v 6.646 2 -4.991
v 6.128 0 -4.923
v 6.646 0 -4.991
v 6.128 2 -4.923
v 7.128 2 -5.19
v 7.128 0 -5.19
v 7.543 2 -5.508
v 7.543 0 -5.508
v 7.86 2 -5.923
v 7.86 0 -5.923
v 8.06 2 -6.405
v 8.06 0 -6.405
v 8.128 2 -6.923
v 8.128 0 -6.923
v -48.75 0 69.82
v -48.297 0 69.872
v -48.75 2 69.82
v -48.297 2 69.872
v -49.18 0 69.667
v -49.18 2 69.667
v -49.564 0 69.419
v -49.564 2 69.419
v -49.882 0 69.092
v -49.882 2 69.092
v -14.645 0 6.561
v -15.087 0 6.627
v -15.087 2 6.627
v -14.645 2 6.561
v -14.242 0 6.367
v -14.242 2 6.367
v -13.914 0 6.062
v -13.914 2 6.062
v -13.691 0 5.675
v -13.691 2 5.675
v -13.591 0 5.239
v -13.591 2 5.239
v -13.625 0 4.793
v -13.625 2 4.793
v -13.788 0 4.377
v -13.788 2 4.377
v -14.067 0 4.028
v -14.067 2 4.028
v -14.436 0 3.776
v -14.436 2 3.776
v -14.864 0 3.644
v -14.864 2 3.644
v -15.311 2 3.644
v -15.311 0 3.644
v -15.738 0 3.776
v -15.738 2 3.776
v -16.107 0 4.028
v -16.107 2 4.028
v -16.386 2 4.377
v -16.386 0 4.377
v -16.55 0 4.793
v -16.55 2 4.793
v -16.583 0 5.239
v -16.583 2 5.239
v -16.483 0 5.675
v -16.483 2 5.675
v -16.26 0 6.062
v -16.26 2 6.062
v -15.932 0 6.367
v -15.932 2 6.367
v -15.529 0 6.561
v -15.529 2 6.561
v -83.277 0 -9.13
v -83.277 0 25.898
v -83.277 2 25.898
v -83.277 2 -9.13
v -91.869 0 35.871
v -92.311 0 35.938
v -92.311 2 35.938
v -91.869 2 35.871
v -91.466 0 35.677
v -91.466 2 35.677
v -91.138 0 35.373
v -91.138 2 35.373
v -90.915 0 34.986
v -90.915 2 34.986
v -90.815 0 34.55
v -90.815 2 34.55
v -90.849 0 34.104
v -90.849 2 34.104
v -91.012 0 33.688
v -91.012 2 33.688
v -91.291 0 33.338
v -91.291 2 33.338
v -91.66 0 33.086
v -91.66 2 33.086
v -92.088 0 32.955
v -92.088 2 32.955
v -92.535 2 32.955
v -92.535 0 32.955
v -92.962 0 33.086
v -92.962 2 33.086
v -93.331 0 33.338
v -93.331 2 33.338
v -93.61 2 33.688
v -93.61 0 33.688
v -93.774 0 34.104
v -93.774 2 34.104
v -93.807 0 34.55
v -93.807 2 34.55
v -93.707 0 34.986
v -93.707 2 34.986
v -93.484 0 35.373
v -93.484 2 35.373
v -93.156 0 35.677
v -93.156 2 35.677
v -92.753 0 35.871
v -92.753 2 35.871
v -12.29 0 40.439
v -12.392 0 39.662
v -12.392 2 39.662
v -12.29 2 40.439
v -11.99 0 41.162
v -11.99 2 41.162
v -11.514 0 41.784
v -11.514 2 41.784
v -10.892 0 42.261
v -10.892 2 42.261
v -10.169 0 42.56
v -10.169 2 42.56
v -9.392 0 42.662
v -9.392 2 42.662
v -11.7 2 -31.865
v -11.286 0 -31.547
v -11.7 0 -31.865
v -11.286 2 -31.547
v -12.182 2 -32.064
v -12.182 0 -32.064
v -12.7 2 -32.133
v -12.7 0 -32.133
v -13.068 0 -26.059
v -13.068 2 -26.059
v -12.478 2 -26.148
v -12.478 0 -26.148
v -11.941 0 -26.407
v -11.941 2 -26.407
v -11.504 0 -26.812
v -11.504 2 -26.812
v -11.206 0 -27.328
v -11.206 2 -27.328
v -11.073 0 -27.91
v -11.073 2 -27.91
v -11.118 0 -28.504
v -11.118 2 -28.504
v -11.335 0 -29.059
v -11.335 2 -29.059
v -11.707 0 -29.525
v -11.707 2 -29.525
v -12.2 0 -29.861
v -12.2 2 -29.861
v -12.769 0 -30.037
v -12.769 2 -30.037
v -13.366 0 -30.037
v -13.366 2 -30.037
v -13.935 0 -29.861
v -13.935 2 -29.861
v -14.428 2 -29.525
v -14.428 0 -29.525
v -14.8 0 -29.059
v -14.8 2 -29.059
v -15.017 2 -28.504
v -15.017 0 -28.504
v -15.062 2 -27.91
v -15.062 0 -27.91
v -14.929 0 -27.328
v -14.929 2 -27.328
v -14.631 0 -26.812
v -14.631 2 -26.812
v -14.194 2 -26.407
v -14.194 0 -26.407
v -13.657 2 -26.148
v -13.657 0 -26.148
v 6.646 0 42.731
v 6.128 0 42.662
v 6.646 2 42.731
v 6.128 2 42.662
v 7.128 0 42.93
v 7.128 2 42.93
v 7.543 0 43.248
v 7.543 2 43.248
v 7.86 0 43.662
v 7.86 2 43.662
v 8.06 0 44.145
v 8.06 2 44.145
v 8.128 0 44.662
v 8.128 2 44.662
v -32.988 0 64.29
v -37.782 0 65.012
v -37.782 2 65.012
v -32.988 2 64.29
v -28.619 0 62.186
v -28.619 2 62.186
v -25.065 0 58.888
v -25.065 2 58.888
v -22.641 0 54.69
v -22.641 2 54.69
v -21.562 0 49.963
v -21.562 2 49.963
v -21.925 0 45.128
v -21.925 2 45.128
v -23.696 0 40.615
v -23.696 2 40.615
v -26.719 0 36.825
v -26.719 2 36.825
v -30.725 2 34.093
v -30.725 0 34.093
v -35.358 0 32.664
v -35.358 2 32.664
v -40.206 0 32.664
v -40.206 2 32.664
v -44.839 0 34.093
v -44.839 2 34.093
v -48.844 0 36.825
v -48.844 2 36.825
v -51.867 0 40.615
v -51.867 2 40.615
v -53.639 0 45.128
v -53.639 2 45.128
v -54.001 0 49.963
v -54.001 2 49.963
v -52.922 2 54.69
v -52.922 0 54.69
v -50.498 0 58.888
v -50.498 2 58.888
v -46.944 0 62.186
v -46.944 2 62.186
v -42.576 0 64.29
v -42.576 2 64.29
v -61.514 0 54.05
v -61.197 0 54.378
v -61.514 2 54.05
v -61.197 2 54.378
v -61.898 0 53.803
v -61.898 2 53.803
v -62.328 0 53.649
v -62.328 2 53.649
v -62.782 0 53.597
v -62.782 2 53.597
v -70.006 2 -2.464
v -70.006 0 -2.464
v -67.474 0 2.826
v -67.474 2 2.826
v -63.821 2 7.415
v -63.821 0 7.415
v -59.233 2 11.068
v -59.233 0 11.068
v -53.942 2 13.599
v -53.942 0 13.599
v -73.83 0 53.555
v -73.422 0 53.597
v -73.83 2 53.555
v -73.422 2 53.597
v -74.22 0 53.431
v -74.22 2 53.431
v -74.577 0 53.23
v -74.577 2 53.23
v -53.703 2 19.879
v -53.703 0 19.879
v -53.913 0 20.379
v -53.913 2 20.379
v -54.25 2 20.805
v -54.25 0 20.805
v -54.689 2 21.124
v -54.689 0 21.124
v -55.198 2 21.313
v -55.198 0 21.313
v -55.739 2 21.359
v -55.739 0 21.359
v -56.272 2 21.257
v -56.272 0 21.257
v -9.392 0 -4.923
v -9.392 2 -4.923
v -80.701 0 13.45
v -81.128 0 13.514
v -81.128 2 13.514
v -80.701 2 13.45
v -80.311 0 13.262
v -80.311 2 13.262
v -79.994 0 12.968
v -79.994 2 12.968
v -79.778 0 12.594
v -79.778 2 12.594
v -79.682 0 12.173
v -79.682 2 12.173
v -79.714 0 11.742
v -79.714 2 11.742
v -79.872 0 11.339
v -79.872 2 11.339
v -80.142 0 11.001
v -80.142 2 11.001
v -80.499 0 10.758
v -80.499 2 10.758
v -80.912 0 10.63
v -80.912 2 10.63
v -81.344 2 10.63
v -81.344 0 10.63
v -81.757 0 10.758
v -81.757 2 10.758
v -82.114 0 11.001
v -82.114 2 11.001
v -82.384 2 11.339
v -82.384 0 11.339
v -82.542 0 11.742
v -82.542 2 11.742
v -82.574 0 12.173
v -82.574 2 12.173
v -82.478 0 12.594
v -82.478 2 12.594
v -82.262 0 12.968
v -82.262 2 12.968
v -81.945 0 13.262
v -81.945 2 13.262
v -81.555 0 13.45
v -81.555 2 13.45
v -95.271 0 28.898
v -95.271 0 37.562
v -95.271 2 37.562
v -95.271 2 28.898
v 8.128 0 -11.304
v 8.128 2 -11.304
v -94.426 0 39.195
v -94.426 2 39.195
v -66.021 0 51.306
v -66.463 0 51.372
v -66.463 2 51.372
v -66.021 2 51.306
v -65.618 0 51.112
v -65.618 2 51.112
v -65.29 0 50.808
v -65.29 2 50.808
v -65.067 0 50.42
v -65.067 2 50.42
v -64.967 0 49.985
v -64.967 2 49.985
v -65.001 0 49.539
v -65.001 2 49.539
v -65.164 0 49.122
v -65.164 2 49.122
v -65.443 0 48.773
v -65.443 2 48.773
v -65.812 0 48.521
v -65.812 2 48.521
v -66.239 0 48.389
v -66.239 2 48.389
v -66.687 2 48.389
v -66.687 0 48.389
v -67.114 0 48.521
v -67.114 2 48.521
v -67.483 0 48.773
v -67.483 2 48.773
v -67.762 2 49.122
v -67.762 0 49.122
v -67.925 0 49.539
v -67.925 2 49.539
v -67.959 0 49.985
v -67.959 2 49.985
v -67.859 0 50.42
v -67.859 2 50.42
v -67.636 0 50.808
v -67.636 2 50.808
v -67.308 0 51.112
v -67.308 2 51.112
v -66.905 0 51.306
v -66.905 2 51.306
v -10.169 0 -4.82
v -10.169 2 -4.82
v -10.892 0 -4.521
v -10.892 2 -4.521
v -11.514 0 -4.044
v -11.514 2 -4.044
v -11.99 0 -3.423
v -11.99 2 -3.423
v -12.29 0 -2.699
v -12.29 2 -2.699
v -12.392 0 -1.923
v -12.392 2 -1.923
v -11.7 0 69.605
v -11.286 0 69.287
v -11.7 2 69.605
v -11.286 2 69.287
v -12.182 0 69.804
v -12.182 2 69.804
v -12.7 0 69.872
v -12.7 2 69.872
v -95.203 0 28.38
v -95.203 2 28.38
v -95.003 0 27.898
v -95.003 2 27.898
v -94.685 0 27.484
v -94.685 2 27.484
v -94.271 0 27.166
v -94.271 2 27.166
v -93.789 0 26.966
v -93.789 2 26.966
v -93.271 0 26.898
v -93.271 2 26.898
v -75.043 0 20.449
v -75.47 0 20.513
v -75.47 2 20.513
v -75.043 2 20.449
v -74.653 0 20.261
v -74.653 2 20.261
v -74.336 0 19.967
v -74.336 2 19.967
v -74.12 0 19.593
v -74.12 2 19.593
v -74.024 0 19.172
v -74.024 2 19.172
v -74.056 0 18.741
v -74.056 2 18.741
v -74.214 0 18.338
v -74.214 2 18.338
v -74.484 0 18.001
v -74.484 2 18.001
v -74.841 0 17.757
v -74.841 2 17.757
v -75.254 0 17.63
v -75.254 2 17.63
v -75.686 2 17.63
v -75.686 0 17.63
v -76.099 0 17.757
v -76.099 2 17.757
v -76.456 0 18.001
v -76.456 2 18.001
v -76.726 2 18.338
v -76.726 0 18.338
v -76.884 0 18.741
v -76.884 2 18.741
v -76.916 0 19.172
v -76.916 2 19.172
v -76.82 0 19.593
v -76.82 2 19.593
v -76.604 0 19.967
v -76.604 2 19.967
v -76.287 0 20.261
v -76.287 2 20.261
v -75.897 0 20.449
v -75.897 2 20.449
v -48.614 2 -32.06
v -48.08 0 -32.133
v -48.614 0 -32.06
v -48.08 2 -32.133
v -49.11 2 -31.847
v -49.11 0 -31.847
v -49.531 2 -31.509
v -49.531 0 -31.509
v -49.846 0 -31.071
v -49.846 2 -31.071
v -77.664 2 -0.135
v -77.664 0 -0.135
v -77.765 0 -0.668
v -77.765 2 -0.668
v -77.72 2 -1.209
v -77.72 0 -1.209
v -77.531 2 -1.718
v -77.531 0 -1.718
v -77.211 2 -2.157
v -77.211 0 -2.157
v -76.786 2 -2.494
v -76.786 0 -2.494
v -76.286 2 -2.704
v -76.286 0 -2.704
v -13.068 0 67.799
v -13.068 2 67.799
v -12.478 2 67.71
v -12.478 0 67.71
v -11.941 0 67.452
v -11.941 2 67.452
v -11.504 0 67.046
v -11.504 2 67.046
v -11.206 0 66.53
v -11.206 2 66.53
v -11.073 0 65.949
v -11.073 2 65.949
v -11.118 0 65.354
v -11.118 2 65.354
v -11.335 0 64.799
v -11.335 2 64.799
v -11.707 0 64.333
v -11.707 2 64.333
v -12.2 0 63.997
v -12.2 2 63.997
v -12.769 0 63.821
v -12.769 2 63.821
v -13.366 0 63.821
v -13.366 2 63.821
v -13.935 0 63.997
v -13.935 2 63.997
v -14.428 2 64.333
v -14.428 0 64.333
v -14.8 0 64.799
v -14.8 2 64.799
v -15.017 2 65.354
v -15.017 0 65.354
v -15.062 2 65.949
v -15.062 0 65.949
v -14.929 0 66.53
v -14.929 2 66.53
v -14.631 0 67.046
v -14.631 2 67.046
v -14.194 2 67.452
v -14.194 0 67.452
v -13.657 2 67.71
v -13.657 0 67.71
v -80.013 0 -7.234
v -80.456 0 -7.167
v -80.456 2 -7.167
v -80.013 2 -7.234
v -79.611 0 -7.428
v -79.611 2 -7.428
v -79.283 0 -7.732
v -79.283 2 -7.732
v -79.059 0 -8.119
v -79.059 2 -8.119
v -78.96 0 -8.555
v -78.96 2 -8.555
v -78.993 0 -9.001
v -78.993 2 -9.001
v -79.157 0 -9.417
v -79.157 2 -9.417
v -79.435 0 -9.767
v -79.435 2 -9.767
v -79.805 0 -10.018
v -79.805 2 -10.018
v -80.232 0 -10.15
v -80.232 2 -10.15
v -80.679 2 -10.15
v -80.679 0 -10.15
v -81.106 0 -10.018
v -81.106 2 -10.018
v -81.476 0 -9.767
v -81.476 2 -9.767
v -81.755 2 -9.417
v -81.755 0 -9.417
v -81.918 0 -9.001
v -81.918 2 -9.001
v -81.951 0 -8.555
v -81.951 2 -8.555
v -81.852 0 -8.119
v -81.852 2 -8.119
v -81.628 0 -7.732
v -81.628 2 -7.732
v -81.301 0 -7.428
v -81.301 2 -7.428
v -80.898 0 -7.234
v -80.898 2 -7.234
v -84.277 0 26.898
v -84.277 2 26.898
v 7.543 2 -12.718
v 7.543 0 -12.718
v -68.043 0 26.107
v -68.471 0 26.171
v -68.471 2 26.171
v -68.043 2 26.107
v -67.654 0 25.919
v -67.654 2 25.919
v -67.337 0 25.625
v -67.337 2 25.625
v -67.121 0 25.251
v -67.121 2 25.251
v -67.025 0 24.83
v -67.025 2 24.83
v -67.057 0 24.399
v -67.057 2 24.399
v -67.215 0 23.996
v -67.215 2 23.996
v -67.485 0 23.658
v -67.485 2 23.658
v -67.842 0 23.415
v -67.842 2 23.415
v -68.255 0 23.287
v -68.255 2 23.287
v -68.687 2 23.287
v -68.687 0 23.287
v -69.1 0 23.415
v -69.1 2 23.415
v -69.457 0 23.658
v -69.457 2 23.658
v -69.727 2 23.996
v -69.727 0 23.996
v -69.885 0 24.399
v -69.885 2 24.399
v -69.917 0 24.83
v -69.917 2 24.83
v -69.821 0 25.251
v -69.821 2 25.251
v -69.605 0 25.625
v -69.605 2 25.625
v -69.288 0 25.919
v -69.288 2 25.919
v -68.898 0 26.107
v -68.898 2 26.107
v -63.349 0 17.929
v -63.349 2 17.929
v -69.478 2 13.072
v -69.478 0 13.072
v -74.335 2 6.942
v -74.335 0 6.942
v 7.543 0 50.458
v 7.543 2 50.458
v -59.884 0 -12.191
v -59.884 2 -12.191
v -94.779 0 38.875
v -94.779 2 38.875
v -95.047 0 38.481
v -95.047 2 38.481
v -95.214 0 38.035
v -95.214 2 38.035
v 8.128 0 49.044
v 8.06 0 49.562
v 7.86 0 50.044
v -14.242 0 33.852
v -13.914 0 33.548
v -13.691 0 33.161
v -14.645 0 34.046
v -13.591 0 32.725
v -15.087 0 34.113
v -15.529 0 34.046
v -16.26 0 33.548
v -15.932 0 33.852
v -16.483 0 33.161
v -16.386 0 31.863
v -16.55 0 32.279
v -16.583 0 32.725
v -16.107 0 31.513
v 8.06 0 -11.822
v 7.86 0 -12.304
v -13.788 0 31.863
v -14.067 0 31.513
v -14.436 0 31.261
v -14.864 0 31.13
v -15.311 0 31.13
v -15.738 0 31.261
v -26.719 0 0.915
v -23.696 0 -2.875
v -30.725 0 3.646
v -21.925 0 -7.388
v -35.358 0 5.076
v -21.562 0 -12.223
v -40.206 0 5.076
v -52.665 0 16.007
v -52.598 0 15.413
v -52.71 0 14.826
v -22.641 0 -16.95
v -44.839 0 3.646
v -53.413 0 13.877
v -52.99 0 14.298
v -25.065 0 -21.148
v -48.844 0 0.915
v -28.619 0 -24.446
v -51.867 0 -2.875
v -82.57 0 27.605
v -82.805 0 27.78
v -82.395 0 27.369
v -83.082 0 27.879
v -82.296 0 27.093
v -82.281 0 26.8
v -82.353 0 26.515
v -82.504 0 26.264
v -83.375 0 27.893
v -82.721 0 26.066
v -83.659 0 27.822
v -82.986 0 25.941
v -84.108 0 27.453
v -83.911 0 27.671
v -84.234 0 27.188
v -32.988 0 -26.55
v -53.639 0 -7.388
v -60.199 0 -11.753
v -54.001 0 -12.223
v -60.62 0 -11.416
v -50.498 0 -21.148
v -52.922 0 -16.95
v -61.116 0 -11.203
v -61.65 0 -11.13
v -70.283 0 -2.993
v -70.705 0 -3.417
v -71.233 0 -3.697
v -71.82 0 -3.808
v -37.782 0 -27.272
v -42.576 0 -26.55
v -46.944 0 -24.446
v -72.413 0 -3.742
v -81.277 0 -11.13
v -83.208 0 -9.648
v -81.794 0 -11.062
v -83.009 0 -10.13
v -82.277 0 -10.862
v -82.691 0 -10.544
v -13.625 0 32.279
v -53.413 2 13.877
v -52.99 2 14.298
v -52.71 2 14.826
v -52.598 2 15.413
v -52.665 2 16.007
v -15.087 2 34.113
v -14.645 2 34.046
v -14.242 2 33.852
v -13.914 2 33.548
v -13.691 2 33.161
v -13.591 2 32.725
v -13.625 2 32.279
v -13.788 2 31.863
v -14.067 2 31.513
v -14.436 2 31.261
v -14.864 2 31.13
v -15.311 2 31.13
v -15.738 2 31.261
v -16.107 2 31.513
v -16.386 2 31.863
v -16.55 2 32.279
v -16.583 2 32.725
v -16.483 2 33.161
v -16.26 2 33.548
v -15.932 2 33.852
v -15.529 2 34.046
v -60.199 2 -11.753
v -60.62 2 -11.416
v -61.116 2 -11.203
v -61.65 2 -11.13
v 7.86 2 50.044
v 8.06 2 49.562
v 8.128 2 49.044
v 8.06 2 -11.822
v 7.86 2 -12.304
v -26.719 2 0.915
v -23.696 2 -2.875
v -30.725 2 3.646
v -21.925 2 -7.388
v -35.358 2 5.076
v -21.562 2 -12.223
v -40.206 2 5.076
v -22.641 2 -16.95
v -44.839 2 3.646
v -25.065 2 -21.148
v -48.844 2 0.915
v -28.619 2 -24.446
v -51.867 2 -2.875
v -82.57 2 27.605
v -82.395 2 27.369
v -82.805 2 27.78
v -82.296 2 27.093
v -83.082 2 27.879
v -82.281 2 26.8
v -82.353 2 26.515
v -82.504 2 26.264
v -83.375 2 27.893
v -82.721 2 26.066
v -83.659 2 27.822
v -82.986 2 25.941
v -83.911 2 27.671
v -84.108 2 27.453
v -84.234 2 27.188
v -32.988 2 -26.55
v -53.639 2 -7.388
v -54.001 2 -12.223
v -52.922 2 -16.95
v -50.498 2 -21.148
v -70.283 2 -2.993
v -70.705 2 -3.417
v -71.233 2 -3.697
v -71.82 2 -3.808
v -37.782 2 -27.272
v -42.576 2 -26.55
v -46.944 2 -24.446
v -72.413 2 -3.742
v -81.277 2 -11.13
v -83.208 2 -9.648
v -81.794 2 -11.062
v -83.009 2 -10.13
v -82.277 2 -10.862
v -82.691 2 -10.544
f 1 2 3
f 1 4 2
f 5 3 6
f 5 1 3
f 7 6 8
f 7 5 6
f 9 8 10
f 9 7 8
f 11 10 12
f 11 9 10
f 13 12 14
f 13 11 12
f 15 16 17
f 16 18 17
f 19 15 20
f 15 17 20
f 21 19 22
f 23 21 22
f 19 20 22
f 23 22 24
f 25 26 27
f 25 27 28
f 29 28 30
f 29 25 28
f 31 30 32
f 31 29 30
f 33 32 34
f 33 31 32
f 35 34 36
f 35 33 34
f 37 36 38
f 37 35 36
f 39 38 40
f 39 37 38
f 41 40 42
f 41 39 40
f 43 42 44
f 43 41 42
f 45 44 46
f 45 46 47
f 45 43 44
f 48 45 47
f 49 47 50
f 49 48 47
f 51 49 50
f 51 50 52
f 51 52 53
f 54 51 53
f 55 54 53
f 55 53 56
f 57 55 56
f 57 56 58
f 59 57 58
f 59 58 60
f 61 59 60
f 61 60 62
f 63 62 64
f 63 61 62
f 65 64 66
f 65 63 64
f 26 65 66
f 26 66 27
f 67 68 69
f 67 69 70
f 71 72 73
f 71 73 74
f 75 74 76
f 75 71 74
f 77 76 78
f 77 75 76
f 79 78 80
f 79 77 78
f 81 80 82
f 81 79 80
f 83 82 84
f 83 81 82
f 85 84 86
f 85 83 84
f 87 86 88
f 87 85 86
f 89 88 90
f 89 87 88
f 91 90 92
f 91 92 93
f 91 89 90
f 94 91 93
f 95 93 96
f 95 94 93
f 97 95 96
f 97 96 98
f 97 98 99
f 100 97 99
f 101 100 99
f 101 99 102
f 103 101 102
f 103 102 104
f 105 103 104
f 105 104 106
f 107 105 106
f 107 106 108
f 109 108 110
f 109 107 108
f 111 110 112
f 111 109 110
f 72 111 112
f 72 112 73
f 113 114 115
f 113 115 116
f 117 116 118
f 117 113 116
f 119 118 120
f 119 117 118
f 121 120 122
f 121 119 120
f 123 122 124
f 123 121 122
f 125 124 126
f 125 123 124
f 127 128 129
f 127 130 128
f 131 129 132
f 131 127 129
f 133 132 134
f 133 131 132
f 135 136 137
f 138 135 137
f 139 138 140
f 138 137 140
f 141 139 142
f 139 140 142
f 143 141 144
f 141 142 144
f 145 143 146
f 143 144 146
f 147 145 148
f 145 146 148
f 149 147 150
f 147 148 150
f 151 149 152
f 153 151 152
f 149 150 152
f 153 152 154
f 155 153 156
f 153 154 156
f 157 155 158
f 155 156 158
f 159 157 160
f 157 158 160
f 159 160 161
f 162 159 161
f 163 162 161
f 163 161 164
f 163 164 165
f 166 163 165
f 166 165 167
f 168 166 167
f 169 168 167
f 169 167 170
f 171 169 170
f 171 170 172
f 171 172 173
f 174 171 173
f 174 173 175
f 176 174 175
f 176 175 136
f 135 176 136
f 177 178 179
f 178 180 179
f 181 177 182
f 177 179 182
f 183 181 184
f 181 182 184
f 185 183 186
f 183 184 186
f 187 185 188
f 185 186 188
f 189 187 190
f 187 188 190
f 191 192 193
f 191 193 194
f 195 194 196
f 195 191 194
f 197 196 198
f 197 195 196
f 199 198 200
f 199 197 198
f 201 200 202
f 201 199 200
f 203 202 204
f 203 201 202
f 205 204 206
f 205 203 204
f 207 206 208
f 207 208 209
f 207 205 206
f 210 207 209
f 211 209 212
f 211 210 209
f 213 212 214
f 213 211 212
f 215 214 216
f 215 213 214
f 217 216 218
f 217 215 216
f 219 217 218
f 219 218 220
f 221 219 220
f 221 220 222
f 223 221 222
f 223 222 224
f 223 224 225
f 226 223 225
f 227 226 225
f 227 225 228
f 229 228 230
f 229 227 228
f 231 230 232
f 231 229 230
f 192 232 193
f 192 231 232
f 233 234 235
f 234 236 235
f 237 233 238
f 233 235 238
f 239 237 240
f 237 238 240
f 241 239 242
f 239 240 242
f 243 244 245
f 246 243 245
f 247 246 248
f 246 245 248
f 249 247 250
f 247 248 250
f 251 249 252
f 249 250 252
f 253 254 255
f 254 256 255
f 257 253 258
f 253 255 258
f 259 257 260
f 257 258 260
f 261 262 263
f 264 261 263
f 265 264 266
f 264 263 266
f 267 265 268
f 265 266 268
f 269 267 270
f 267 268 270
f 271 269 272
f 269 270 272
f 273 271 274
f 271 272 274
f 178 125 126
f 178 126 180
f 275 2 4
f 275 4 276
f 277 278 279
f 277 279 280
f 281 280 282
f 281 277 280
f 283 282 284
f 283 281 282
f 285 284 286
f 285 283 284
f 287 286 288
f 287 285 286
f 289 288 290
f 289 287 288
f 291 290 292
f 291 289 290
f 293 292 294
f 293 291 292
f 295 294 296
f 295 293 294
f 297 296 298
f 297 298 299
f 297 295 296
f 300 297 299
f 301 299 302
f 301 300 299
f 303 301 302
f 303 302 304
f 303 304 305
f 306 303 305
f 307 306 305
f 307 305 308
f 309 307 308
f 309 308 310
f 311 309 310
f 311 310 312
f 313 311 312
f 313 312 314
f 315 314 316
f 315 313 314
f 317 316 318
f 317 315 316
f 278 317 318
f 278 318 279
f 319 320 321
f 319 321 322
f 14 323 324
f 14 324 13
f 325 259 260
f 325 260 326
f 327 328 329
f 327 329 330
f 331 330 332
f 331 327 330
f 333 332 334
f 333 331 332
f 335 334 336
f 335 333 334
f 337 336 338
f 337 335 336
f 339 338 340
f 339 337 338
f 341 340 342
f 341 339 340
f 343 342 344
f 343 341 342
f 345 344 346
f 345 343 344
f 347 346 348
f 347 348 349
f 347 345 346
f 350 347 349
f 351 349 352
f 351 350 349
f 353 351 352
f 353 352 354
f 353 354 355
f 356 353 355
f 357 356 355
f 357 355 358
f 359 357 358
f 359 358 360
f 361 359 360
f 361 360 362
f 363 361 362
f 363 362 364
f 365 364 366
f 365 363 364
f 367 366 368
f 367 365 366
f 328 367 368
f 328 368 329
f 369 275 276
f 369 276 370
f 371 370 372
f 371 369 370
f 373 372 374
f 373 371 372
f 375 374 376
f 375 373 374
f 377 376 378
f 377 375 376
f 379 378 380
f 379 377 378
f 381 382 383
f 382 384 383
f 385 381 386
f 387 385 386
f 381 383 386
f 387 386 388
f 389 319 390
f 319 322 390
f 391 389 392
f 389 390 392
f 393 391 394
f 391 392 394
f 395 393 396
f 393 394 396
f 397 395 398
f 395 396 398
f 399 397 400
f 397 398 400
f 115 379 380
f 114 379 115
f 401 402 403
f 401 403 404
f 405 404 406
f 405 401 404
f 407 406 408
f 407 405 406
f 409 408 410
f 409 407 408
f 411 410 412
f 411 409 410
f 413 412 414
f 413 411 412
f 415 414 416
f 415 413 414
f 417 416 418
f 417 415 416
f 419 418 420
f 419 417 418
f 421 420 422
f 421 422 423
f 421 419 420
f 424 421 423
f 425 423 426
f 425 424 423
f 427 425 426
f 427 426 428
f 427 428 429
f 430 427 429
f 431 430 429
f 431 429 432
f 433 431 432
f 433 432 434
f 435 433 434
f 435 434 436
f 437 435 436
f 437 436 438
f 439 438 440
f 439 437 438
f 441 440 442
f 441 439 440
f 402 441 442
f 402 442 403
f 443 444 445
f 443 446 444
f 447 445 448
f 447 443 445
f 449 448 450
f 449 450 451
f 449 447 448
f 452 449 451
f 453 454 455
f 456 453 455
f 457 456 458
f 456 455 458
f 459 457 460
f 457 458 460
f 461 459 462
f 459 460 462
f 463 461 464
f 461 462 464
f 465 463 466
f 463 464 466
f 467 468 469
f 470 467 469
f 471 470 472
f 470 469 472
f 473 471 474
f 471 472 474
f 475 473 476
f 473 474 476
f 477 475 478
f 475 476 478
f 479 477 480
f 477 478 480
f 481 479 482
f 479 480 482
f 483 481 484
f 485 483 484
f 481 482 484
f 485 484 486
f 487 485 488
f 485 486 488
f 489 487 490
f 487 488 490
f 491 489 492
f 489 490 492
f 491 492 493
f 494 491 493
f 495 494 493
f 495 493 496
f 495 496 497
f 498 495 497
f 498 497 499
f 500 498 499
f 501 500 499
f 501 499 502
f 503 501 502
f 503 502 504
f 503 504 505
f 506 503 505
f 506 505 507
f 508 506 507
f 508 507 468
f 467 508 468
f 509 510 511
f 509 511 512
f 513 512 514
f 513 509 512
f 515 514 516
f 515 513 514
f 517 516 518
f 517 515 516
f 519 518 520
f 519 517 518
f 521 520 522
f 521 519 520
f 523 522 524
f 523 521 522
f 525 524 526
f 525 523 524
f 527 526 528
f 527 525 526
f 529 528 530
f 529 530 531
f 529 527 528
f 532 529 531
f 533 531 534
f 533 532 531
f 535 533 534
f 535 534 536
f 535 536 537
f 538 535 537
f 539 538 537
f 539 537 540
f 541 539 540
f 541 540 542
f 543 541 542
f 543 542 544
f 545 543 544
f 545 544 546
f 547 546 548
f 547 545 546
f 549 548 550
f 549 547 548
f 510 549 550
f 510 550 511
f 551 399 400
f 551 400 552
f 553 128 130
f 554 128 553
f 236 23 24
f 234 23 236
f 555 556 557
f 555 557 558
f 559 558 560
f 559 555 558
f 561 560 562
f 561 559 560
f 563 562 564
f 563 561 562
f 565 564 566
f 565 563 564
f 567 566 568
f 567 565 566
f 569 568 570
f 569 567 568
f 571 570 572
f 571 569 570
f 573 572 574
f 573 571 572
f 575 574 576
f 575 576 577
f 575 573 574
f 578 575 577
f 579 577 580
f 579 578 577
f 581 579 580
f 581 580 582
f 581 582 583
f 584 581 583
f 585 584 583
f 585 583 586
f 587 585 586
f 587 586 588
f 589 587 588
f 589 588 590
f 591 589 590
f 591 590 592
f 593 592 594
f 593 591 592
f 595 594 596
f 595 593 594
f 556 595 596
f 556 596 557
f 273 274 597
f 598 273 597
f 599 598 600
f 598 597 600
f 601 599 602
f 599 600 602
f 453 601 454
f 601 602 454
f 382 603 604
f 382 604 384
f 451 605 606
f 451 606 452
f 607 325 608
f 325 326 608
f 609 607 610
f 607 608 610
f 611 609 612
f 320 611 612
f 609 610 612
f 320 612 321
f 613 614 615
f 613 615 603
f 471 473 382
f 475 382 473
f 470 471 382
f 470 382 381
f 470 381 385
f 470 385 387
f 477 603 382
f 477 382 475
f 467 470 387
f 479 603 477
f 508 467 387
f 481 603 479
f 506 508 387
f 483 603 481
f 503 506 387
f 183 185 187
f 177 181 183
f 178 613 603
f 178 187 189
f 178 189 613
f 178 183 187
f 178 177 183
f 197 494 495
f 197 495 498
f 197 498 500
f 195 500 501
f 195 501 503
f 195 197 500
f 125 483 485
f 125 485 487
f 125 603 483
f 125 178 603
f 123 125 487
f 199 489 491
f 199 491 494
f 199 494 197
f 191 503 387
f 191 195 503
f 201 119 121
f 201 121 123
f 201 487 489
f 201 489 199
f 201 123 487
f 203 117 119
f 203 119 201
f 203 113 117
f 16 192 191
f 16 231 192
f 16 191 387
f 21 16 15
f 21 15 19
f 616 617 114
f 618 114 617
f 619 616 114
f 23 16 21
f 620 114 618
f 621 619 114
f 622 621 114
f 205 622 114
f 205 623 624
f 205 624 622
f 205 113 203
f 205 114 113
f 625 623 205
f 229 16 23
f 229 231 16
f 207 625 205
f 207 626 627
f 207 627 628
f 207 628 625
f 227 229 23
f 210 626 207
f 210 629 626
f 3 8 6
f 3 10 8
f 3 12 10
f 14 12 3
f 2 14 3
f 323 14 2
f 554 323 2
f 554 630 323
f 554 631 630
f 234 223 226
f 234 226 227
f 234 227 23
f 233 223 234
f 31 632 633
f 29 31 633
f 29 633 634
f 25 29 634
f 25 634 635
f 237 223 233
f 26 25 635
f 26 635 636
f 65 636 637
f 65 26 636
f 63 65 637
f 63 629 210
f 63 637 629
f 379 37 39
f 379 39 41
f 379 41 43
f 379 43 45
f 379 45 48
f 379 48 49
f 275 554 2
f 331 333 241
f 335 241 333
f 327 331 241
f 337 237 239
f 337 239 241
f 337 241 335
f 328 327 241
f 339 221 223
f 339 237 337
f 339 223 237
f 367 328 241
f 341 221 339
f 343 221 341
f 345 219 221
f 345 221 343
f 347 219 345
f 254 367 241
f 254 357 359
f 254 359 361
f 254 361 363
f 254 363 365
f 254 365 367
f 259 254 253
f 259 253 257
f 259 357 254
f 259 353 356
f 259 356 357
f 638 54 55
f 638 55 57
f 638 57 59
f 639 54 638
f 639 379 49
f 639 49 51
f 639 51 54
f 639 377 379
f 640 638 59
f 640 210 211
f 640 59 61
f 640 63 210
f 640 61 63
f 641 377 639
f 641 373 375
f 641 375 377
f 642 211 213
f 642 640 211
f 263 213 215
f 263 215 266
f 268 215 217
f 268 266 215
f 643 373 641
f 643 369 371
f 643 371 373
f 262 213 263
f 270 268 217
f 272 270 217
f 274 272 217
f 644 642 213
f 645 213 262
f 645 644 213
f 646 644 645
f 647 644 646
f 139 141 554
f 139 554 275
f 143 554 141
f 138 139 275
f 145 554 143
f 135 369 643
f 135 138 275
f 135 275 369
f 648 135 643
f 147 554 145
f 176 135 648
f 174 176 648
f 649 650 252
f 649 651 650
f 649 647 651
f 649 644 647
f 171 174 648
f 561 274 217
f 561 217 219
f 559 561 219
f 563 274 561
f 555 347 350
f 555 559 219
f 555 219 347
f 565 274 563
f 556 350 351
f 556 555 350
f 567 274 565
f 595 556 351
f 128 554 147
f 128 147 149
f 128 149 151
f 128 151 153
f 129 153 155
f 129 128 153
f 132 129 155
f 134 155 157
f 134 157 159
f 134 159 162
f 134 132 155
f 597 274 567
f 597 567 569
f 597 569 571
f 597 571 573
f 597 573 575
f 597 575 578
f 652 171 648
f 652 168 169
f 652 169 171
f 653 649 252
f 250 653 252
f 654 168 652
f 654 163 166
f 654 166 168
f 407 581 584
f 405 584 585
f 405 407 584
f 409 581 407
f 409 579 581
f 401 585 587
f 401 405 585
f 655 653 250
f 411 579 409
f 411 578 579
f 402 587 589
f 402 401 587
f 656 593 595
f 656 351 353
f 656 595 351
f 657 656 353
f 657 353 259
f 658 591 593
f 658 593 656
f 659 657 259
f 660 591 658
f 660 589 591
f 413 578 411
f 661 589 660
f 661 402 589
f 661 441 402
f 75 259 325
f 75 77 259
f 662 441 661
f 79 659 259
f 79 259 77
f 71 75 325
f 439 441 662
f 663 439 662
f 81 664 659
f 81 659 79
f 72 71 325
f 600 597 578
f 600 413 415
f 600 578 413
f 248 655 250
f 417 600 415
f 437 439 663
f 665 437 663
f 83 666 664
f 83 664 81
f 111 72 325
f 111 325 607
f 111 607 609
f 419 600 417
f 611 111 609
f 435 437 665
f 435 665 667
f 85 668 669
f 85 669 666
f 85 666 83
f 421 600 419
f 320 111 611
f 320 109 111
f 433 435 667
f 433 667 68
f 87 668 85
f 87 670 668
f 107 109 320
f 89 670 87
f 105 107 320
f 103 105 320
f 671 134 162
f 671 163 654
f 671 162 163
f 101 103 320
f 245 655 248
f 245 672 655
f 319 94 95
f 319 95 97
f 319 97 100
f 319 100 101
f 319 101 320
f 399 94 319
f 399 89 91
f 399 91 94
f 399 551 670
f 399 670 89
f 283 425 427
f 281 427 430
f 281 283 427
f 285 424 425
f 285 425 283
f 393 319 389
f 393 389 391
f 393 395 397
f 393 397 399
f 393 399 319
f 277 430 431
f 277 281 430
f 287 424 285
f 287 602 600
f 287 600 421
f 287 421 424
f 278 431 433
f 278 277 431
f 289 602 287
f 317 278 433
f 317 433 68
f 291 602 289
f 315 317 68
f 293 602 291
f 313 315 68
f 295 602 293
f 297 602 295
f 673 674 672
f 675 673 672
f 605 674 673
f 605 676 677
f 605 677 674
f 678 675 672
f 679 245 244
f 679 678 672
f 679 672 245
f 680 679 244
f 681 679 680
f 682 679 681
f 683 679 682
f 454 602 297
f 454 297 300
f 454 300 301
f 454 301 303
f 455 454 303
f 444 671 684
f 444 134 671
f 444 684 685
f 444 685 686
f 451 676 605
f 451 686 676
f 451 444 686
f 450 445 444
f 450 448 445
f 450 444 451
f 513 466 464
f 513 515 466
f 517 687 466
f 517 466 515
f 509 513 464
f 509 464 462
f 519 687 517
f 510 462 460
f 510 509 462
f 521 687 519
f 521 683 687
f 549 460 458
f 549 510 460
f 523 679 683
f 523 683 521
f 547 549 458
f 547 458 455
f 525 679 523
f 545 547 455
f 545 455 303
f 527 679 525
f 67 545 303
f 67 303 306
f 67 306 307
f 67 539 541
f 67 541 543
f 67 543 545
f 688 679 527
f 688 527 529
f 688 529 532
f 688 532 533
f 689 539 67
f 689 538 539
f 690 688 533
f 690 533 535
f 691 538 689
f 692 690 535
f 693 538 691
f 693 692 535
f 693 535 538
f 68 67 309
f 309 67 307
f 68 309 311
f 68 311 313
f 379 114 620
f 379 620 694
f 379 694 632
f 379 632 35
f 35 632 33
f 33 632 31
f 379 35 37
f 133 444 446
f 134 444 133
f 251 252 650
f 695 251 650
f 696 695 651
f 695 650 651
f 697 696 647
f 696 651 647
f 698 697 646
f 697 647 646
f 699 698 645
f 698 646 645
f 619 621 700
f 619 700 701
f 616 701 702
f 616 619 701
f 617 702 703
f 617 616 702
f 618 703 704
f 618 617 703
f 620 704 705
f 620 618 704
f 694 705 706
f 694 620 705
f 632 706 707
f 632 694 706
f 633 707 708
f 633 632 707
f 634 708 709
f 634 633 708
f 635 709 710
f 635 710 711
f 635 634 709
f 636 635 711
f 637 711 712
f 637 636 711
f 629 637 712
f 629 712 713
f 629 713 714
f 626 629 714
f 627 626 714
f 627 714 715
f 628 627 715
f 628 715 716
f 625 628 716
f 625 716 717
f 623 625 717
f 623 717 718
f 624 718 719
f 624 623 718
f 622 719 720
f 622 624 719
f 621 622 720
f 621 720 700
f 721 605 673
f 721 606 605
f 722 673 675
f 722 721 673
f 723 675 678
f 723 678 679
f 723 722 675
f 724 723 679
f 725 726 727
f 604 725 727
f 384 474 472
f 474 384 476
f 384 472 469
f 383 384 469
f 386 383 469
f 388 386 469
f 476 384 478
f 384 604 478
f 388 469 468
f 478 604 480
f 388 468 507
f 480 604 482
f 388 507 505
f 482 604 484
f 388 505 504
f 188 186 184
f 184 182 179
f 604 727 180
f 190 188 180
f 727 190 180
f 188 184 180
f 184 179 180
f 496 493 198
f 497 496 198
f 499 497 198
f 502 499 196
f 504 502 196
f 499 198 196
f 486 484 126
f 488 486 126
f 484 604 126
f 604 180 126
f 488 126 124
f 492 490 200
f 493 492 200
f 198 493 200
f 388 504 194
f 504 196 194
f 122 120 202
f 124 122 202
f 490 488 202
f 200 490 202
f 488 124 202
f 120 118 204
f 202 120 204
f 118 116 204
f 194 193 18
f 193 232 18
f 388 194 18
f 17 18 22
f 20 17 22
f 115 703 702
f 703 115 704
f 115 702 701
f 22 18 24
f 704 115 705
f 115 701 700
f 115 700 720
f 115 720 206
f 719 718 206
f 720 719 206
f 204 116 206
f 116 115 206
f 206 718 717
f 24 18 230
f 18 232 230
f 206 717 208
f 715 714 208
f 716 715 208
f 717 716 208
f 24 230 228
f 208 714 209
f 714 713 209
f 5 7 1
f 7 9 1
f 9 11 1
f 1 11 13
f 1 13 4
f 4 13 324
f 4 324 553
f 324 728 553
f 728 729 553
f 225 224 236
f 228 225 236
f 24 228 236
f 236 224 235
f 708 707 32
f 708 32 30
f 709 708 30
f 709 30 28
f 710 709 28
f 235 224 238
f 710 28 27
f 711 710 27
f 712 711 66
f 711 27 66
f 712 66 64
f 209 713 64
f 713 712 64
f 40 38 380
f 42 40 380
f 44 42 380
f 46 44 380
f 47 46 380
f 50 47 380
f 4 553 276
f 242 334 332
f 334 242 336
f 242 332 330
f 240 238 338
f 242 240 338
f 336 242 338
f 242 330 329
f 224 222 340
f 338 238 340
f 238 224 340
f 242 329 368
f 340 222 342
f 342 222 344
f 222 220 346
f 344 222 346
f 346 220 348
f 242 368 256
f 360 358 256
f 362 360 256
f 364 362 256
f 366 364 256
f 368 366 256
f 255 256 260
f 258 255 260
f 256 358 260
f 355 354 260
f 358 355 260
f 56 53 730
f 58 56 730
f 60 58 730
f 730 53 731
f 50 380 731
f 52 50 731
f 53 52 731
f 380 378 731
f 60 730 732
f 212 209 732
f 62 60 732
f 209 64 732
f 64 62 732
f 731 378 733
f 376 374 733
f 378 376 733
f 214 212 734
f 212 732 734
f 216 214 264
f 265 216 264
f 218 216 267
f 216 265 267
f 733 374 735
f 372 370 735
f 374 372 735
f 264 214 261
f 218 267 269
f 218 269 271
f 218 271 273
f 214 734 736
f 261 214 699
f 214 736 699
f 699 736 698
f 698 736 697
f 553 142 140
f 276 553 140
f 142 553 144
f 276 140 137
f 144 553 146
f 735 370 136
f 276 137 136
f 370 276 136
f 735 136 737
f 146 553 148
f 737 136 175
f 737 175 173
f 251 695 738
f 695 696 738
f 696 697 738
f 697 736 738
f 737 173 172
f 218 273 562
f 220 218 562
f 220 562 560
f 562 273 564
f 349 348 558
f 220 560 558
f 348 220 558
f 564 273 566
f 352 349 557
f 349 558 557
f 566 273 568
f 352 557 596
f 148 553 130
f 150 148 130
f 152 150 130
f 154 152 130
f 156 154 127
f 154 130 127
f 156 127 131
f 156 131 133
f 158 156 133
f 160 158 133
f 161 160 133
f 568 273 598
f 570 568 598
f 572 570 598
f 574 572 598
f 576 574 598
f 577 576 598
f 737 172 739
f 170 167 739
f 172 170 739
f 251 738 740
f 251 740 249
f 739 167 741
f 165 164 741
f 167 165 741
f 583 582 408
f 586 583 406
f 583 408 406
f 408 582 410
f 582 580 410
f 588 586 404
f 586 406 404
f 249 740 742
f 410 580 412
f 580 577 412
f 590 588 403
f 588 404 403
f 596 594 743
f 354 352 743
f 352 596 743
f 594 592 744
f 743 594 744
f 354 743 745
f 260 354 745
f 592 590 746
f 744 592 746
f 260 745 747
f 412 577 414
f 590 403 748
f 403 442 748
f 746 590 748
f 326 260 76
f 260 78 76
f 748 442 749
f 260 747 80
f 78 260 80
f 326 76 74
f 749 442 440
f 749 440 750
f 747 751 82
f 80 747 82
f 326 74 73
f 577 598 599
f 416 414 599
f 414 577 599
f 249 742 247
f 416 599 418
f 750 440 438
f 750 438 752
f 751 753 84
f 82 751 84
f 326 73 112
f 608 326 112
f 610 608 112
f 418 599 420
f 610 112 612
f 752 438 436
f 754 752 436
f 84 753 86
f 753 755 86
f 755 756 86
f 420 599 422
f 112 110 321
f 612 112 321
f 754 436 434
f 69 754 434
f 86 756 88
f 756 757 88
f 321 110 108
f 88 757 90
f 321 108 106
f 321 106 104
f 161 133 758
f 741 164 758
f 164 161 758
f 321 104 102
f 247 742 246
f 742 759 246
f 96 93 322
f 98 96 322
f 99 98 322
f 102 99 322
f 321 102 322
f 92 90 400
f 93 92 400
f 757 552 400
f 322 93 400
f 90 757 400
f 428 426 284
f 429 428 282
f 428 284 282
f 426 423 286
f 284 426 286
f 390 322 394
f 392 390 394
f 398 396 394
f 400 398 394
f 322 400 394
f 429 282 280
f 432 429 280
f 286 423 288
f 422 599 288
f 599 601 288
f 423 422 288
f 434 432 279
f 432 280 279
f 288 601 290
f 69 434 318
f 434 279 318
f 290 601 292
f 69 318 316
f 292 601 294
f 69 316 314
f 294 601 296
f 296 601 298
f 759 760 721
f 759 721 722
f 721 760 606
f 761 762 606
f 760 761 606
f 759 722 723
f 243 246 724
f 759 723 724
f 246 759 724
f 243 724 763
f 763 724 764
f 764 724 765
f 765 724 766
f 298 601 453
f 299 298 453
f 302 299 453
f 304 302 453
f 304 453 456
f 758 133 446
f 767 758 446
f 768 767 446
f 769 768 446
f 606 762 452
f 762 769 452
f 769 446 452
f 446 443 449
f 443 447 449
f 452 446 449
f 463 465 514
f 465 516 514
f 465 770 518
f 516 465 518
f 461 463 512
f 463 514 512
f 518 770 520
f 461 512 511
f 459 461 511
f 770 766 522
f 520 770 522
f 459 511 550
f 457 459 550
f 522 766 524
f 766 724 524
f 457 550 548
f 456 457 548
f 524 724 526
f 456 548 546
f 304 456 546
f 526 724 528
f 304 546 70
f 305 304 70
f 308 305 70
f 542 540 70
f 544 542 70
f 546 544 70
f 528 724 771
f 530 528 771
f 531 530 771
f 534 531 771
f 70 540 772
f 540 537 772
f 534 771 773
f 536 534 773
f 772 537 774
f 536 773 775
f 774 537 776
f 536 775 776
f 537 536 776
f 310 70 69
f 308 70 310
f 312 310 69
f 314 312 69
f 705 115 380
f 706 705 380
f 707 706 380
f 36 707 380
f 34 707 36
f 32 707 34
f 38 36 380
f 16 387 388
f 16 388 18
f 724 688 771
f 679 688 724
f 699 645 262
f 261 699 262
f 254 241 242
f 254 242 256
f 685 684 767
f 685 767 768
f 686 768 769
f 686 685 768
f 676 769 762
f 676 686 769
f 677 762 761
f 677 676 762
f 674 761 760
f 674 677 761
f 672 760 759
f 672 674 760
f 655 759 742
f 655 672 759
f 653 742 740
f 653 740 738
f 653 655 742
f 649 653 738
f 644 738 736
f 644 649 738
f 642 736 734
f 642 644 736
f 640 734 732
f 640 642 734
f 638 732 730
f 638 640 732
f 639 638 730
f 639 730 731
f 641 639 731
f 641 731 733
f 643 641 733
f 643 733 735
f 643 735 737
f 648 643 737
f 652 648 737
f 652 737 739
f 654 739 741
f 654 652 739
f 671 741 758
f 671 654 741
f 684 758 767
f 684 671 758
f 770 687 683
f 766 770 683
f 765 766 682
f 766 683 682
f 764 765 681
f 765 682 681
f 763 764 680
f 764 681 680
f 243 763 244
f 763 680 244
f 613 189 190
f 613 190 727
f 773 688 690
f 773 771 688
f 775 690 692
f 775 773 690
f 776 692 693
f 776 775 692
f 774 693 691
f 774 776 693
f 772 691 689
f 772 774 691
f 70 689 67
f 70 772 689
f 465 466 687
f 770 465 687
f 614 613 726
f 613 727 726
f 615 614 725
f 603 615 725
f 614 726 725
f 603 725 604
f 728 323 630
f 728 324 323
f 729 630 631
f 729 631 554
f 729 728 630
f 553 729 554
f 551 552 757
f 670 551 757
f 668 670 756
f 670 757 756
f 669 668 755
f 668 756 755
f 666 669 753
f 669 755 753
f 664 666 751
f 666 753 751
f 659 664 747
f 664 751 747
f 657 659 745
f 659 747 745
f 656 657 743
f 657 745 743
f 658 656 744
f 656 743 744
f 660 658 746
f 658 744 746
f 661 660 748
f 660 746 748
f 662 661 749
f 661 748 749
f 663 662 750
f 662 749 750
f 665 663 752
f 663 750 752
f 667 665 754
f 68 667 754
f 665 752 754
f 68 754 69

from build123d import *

# Parameters (mm, degrees)
SKETCH1_R           = 16.264719519
SKETCH1_R_2         = 1.5
SKETCH1_R_3         = 1.45
BOSS_EXTRUDE1_DEPTH = 2
SKETCH2_R           = 2
CUT_EXTRUDE1_DEPTH  = 119.16416129
FILLET1_R           = 2
SKETCH3_R           = 1
CUT_EXTRUDE2_DEPTH  = 10


with BuildPart() as part:
    # Sketch1 → Boss-Extrude1 (new body)
    with BuildSketch(Plane(origin=(0, 0, 0), x_dir=(1, 0, 0), z_dir=(0, 1, 0))):
        with BuildLine():
            Line((-12.392234006, -6.981301864), (-12.392234006, -30.758658484))
            Line((-12.392234006, -30.758658484), (-12.392234006, -37.869980174))
            Line((-12.392234006, -37.869980174), (-12.392234006, -39.662475092))
            ThreePointArc((-12.392234006, -39.662475092), (-11.513554349, -41.783795436), (-9.392234006, -42.662475092))
            Line((-9.392234006, -42.662475092), (8.128346254, -42.662475092))
            Line((8.128346254, -42.662475092), (8.128346254, -49.872480174))
            Line((8.128346254, -49.872480174), (-11.871653746, -69.872480174))
            Line((-11.871653746, -69.872480174), (-49.281653746, -69.872480174))
            Line((-49.281653746, -69.872480174), (-61.796944846, -53.596788721))
            Line((-61.796944846, -53.596788721), (-74.058017443, -53.596788721))
            Line((-74.058017443, -53.596788721), (-95.271220878, -38.596788721))
            Line((-95.271220878, -38.596788721), (-95.271220878, -26.897908721))
            Line((-95.271220878, -26.897908721), (-84.130114655, -26.897908721))
            Line((-84.130114655, -26.897908721), (-83.276622696, -26.897908721))
            Line((-83.276622696, -26.897908721), (-83.276622696, 11.130019826))
            Line((-83.276622696, 11.130019826), (-60.448477034, 11.130019826))
            Line((-60.448477034, 11.130019826), (-49.281653746, 32.132519826))
            Line((-49.281653746, 32.132519826), (-11.871653746, 32.132519826))
            Line((-11.871653746, 32.132519826), (8.128346254, 12.132519826))
            Line((8.128346254, 12.132519826), (8.128346254, 4.922514744))
            Line((8.128346254, 4.922514744), (-9.392234006, 4.922514744))
            ThreePointArc((-9.392234006, 4.922514744), (-11.513554349, 4.043835088), (-12.392234006, 1.922514744))
            Line((-12.392234006, 1.922514744), (-12.392234006, 0.130019826))
            Line((-12.392234006, 0.130019826), (-12.392234006, -6.981301864))
        make_face()
        with Locations(Location((-37.781653746, -48.747480173, 0), (0, 0, 270))):
            Circle(SKETCH1_R, mode=Mode.SUBTRACT)
        with Locations(Location((-37.781653746, 11.007519825, 0), (0, 0, 90))):
            Circle(SKETCH1_R, mode=Mode.SUBTRACT)
        with Locations(Location((-15.087114055, -5.127161907, 0), (0, 0, 270))):
            Circle(SKETCH1_R_2, mode=Mode.SUBTRACT)
        with Locations(Location((-15.087114055, -32.612798441, 0), (0, 0, 270))):
            Circle(SKETCH1_R_2, mode=Mode.SUBTRACT)
        with Locations(Location((-81.12792954, -12.064242343, 0), (0, 0, 270))):
            Circle(SKETCH1_R_3, mode=Mode.SUBTRACT)
        with Locations(Location((-75.470082252, -19.063439731, 0), (0, 0, 270))):
            Circle(SKETCH1_R_3, mode=Mode.SUBTRACT)
        with Locations(Location((-68.470884865, -24.721287018, 0), (0, 0, 270))):
            Circle(SKETCH1_R_3, mode=Mode.SUBTRACT)
        with Locations(Location((-92.311157954, -34.437864429, 0), (0, 0, 270))):
            Circle(SKETCH1_R_2, mode=Mode.SUBTRACT)
        with Locations(Location((-66.462987255, -49.872480174, 0), (0, 0, 270))):
            Circle(SKETCH1_R_2, mode=Mode.SUBTRACT)
        with Locations(Location((-80.455556672, 8.666951386, 0), (0, 0, 270))):
            Circle(SKETCH1_R_2, mode=Mode.SUBTRACT)
        with BuildLine():
            Line((-52.664953624, -16.00672876), (-53.702548501, -19.879085561))
            ThreePointArc((-53.702548501, -19.879085561), (-54.689042095, -21.123916801), (-56.271766971, -21.257169903))
            ThreePointArc((-56.271766971, -21.257169903), (-69.478161637, -13.071519115), (-77.663812425, 0.13487555))
            ThreePointArc((-77.663812425, 0.13487555), (-77.530559323, 1.717600427), (-76.285728083, 2.70409402))
            Line((-76.285728083, 2.70409402), (-72.413371282, 3.741688898))
            ThreePointArc((-72.413371282, 3.741688898), (-70.958270463, 3.576518776), (-70.005790184, 2.464142545))
            ThreePointArc((-70.005790184, 2.464142545), (-63.821307387, -7.414664865), (-53.942499976, -13.599147662))
            ThreePointArc((-53.942499976, -13.599147662), (-52.830123745, -14.551627941), (-52.664953624, -16.00672876))
        make_face(mode=Mode.SUBTRACT)
    extrude(amount=BOSS_EXTRUDE1_DEPTH)

    # Sketch2 → Cut-Extrude1 (cut, through all)
    with BuildSketch(Plane(origin=(0, 2, 0), x_dir=(1, 0, 0), z_dir=(0, 1, 0))):
        with Locations(Location((-13.067528443, -65.799136603, 0), (0, 0, 270))):
            Circle(SKETCH2_R)
        with Locations(Location((-13.067528443, 28.059176255, 0), (0, 0, 270))):
            Circle(SKETCH2_R)
    extrude(amount=-CUT_EXTRUDE1_DEPTH, mode=Mode.SUBTRACT)

    # Fillet1
    fillet1_edges = [part.edges().sort_by_distance(p)[0] for p in [
        (-49.281653746, 1, -32.132519826),
        (-11.871653746, 1, -32.132519826),
        (8.128346254, 1, -12.132519826),
        (8.128346254, 1, -4.922514744),
        (8.128346254, 1, 42.662475092),
        (8.128346254, 1, 49.872480174),
        (-11.871653746, 1, 69.872480174),
        (-49.281653746, 1, 69.872480174),
        (-61.796944846, 1, 53.596788721),
        (-74.058017443, 1, 53.596788721),
        (-95.271220878, 1, 38.596788721),
        (-95.271220878, 1, 26.897908721),
        (-83.276622696, 1, -11.130019826),
        (-60.448477034, 1, -11.130019826),
    ]]
    fillet(fillet1_edges, radius=FILLET1_R)

    # Sketch3 → Cut-Extrude2 (cut)
    with BuildSketch(Plane(origin=(0, 2, 0), x_dir=(1, 0, 0), z_dir=(0, 1, 0))):
        with Locations((-83.276622696, -26.897908721)):
            Circle(SKETCH3_R)
    extrude(amount=-CUT_EXTRUDE2_DEPTH, mode=Mode.SUBTRACT)


solid = part.part
